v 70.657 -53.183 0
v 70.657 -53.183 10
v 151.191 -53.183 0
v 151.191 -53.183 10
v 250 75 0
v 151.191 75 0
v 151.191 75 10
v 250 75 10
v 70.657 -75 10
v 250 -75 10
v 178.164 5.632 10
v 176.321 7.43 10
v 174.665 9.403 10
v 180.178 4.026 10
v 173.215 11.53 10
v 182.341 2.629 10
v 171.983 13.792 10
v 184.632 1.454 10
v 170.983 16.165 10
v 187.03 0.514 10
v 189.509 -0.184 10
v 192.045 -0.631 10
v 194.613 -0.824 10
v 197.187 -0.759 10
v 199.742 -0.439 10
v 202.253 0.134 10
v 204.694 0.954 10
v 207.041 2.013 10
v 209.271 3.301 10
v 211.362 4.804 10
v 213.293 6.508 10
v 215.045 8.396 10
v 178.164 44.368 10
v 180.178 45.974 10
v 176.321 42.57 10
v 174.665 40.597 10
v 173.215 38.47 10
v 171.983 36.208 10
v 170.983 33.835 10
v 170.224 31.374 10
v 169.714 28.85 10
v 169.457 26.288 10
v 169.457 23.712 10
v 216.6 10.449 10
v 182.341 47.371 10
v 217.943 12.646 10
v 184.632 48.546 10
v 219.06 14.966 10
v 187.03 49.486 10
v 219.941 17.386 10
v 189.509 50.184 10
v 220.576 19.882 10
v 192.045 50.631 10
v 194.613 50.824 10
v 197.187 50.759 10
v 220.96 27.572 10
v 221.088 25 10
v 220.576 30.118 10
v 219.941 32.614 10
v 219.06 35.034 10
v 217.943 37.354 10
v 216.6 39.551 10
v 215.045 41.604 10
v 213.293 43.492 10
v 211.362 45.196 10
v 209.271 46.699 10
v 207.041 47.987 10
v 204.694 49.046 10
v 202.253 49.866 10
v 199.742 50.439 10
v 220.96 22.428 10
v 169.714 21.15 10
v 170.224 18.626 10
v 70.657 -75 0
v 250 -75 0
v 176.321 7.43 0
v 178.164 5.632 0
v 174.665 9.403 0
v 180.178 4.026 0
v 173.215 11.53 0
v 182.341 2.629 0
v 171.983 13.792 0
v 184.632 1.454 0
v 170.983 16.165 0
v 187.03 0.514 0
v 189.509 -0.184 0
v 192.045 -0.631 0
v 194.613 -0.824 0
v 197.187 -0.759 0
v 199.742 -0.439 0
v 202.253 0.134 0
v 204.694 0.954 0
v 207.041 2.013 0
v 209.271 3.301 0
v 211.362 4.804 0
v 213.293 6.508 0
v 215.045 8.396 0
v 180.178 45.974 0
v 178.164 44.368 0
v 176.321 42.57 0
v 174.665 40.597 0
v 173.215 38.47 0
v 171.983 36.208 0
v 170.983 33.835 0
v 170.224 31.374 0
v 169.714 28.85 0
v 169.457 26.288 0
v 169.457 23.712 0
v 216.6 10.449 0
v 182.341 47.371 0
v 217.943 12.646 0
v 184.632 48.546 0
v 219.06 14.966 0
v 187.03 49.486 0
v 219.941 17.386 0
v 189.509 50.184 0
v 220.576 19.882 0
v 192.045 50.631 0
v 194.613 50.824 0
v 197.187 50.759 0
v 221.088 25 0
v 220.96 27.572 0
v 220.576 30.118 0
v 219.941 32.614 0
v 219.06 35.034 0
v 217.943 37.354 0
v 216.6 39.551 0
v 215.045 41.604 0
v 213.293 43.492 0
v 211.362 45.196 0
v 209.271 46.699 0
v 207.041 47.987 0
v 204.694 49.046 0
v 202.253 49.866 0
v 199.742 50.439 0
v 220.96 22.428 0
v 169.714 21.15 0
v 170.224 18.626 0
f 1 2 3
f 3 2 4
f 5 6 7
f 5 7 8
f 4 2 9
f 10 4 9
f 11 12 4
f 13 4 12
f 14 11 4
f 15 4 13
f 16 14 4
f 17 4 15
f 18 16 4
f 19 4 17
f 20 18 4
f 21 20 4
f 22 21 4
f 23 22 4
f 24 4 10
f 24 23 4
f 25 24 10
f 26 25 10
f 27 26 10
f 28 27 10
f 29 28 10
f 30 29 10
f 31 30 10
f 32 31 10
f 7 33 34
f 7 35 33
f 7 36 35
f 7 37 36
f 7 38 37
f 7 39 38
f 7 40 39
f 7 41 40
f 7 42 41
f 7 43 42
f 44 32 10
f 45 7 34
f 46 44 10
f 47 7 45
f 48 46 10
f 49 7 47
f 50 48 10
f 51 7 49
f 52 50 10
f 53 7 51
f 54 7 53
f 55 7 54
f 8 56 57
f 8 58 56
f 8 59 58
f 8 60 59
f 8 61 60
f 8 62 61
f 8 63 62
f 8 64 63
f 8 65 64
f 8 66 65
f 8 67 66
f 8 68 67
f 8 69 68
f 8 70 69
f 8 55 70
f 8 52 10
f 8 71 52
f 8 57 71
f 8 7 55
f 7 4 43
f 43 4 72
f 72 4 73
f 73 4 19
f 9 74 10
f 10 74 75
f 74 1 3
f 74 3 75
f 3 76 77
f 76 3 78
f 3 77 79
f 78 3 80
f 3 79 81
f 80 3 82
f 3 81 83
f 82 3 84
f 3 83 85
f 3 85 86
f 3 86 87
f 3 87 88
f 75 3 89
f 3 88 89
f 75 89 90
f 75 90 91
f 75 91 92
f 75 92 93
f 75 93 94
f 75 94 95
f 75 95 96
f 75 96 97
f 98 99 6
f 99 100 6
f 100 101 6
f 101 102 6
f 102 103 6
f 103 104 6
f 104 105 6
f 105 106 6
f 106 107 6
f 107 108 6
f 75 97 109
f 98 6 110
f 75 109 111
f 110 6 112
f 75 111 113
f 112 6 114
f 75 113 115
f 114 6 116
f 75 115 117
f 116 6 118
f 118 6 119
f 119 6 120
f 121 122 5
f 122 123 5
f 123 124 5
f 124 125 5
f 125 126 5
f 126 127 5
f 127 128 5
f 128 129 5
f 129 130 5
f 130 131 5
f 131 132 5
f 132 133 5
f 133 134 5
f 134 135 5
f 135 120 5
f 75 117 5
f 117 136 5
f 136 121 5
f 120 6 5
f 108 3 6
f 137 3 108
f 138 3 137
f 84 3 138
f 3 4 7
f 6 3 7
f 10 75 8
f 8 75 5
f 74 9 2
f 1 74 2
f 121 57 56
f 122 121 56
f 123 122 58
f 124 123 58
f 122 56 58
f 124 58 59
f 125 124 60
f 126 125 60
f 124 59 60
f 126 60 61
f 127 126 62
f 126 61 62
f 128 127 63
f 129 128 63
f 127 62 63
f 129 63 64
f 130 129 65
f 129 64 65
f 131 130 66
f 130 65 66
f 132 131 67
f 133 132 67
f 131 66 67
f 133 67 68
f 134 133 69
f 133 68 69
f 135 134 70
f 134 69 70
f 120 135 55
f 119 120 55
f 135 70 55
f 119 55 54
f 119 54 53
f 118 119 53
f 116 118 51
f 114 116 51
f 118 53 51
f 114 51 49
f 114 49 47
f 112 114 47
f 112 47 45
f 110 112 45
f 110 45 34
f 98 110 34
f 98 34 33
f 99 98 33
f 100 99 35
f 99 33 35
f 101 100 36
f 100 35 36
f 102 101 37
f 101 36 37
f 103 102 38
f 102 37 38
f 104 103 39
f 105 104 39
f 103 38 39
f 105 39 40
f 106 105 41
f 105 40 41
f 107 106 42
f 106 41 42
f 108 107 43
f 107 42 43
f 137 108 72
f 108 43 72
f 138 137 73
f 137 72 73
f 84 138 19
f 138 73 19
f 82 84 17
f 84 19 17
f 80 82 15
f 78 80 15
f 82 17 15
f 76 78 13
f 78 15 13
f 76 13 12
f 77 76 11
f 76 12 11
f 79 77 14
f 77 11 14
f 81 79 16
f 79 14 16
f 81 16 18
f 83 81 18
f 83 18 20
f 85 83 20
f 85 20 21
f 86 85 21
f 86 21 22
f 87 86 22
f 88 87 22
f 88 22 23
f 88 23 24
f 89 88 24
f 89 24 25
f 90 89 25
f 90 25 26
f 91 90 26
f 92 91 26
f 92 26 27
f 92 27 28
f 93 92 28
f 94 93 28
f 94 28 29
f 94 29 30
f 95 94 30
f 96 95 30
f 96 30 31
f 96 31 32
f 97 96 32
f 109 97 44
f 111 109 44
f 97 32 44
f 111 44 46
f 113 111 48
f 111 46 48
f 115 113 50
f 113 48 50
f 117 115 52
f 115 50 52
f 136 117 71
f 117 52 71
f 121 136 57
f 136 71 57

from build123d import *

# Parameters (mm, degrees)
SKETCH1_W           = 500
SKETCH1_H           = 150
BOSS_EXTRUDE1_DEPTH = 10
SKETCH2_R           = 25.831615562
CUT_EXTRUDE1_DEPTH  = 10
SKETCH3_W           = 401.190926376
SKETCH3_H           = 128.182737921
CUT_EXTRUDE2_DEPTH  = 10
SKETCH5_W           = 641.31413219
SKETCH5_H           = 43.634524158
CUT_EXTRUDE3_DEPTH  = 10


with BuildPart() as part:
    # Sketch1 → Boss-Extrude1 (new body)
    with BuildSketch(Plane.XY):
        Rectangle(SKETCH1_W, SKETCH1_H)
    extrude(amount=BOSS_EXTRUDE1_DEPTH)

    # Sketch2 → Cut-Extrude1 (cut)
    with BuildSketch(Plane.XY.offset(10)):
        with Locations((195.256623511, 25)):
            Circle(SKETCH2_R)
    extrude(amount=-CUT_EXTRUDE1_DEPTH, mode=Mode.SUBTRACT)

    # Sketch3 → Cut-Extrude2 (cut)
    with BuildSketch(Plane.XY.offset(10)):
        with Locations((-49.404536812, 10.908631039)):
            Rectangle(SKETCH3_W, SKETCH3_H)
    extrude(amount=-CUT_EXTRUDE2_DEPTH, mode=Mode.SUBTRACT)

    # Sketch5 → Cut-Extrude3 (cut)
    with BuildSketch(Plane.XY.offset(10)):
        with Locations((-250, -53.182737921)):
            Rectangle(SKETCH5_W, SKETCH5_H)
    extrude(amount=-CUT_EXTRUDE3_DEPTH, mode=Mode.SUBTRACT)


solid = part.part
